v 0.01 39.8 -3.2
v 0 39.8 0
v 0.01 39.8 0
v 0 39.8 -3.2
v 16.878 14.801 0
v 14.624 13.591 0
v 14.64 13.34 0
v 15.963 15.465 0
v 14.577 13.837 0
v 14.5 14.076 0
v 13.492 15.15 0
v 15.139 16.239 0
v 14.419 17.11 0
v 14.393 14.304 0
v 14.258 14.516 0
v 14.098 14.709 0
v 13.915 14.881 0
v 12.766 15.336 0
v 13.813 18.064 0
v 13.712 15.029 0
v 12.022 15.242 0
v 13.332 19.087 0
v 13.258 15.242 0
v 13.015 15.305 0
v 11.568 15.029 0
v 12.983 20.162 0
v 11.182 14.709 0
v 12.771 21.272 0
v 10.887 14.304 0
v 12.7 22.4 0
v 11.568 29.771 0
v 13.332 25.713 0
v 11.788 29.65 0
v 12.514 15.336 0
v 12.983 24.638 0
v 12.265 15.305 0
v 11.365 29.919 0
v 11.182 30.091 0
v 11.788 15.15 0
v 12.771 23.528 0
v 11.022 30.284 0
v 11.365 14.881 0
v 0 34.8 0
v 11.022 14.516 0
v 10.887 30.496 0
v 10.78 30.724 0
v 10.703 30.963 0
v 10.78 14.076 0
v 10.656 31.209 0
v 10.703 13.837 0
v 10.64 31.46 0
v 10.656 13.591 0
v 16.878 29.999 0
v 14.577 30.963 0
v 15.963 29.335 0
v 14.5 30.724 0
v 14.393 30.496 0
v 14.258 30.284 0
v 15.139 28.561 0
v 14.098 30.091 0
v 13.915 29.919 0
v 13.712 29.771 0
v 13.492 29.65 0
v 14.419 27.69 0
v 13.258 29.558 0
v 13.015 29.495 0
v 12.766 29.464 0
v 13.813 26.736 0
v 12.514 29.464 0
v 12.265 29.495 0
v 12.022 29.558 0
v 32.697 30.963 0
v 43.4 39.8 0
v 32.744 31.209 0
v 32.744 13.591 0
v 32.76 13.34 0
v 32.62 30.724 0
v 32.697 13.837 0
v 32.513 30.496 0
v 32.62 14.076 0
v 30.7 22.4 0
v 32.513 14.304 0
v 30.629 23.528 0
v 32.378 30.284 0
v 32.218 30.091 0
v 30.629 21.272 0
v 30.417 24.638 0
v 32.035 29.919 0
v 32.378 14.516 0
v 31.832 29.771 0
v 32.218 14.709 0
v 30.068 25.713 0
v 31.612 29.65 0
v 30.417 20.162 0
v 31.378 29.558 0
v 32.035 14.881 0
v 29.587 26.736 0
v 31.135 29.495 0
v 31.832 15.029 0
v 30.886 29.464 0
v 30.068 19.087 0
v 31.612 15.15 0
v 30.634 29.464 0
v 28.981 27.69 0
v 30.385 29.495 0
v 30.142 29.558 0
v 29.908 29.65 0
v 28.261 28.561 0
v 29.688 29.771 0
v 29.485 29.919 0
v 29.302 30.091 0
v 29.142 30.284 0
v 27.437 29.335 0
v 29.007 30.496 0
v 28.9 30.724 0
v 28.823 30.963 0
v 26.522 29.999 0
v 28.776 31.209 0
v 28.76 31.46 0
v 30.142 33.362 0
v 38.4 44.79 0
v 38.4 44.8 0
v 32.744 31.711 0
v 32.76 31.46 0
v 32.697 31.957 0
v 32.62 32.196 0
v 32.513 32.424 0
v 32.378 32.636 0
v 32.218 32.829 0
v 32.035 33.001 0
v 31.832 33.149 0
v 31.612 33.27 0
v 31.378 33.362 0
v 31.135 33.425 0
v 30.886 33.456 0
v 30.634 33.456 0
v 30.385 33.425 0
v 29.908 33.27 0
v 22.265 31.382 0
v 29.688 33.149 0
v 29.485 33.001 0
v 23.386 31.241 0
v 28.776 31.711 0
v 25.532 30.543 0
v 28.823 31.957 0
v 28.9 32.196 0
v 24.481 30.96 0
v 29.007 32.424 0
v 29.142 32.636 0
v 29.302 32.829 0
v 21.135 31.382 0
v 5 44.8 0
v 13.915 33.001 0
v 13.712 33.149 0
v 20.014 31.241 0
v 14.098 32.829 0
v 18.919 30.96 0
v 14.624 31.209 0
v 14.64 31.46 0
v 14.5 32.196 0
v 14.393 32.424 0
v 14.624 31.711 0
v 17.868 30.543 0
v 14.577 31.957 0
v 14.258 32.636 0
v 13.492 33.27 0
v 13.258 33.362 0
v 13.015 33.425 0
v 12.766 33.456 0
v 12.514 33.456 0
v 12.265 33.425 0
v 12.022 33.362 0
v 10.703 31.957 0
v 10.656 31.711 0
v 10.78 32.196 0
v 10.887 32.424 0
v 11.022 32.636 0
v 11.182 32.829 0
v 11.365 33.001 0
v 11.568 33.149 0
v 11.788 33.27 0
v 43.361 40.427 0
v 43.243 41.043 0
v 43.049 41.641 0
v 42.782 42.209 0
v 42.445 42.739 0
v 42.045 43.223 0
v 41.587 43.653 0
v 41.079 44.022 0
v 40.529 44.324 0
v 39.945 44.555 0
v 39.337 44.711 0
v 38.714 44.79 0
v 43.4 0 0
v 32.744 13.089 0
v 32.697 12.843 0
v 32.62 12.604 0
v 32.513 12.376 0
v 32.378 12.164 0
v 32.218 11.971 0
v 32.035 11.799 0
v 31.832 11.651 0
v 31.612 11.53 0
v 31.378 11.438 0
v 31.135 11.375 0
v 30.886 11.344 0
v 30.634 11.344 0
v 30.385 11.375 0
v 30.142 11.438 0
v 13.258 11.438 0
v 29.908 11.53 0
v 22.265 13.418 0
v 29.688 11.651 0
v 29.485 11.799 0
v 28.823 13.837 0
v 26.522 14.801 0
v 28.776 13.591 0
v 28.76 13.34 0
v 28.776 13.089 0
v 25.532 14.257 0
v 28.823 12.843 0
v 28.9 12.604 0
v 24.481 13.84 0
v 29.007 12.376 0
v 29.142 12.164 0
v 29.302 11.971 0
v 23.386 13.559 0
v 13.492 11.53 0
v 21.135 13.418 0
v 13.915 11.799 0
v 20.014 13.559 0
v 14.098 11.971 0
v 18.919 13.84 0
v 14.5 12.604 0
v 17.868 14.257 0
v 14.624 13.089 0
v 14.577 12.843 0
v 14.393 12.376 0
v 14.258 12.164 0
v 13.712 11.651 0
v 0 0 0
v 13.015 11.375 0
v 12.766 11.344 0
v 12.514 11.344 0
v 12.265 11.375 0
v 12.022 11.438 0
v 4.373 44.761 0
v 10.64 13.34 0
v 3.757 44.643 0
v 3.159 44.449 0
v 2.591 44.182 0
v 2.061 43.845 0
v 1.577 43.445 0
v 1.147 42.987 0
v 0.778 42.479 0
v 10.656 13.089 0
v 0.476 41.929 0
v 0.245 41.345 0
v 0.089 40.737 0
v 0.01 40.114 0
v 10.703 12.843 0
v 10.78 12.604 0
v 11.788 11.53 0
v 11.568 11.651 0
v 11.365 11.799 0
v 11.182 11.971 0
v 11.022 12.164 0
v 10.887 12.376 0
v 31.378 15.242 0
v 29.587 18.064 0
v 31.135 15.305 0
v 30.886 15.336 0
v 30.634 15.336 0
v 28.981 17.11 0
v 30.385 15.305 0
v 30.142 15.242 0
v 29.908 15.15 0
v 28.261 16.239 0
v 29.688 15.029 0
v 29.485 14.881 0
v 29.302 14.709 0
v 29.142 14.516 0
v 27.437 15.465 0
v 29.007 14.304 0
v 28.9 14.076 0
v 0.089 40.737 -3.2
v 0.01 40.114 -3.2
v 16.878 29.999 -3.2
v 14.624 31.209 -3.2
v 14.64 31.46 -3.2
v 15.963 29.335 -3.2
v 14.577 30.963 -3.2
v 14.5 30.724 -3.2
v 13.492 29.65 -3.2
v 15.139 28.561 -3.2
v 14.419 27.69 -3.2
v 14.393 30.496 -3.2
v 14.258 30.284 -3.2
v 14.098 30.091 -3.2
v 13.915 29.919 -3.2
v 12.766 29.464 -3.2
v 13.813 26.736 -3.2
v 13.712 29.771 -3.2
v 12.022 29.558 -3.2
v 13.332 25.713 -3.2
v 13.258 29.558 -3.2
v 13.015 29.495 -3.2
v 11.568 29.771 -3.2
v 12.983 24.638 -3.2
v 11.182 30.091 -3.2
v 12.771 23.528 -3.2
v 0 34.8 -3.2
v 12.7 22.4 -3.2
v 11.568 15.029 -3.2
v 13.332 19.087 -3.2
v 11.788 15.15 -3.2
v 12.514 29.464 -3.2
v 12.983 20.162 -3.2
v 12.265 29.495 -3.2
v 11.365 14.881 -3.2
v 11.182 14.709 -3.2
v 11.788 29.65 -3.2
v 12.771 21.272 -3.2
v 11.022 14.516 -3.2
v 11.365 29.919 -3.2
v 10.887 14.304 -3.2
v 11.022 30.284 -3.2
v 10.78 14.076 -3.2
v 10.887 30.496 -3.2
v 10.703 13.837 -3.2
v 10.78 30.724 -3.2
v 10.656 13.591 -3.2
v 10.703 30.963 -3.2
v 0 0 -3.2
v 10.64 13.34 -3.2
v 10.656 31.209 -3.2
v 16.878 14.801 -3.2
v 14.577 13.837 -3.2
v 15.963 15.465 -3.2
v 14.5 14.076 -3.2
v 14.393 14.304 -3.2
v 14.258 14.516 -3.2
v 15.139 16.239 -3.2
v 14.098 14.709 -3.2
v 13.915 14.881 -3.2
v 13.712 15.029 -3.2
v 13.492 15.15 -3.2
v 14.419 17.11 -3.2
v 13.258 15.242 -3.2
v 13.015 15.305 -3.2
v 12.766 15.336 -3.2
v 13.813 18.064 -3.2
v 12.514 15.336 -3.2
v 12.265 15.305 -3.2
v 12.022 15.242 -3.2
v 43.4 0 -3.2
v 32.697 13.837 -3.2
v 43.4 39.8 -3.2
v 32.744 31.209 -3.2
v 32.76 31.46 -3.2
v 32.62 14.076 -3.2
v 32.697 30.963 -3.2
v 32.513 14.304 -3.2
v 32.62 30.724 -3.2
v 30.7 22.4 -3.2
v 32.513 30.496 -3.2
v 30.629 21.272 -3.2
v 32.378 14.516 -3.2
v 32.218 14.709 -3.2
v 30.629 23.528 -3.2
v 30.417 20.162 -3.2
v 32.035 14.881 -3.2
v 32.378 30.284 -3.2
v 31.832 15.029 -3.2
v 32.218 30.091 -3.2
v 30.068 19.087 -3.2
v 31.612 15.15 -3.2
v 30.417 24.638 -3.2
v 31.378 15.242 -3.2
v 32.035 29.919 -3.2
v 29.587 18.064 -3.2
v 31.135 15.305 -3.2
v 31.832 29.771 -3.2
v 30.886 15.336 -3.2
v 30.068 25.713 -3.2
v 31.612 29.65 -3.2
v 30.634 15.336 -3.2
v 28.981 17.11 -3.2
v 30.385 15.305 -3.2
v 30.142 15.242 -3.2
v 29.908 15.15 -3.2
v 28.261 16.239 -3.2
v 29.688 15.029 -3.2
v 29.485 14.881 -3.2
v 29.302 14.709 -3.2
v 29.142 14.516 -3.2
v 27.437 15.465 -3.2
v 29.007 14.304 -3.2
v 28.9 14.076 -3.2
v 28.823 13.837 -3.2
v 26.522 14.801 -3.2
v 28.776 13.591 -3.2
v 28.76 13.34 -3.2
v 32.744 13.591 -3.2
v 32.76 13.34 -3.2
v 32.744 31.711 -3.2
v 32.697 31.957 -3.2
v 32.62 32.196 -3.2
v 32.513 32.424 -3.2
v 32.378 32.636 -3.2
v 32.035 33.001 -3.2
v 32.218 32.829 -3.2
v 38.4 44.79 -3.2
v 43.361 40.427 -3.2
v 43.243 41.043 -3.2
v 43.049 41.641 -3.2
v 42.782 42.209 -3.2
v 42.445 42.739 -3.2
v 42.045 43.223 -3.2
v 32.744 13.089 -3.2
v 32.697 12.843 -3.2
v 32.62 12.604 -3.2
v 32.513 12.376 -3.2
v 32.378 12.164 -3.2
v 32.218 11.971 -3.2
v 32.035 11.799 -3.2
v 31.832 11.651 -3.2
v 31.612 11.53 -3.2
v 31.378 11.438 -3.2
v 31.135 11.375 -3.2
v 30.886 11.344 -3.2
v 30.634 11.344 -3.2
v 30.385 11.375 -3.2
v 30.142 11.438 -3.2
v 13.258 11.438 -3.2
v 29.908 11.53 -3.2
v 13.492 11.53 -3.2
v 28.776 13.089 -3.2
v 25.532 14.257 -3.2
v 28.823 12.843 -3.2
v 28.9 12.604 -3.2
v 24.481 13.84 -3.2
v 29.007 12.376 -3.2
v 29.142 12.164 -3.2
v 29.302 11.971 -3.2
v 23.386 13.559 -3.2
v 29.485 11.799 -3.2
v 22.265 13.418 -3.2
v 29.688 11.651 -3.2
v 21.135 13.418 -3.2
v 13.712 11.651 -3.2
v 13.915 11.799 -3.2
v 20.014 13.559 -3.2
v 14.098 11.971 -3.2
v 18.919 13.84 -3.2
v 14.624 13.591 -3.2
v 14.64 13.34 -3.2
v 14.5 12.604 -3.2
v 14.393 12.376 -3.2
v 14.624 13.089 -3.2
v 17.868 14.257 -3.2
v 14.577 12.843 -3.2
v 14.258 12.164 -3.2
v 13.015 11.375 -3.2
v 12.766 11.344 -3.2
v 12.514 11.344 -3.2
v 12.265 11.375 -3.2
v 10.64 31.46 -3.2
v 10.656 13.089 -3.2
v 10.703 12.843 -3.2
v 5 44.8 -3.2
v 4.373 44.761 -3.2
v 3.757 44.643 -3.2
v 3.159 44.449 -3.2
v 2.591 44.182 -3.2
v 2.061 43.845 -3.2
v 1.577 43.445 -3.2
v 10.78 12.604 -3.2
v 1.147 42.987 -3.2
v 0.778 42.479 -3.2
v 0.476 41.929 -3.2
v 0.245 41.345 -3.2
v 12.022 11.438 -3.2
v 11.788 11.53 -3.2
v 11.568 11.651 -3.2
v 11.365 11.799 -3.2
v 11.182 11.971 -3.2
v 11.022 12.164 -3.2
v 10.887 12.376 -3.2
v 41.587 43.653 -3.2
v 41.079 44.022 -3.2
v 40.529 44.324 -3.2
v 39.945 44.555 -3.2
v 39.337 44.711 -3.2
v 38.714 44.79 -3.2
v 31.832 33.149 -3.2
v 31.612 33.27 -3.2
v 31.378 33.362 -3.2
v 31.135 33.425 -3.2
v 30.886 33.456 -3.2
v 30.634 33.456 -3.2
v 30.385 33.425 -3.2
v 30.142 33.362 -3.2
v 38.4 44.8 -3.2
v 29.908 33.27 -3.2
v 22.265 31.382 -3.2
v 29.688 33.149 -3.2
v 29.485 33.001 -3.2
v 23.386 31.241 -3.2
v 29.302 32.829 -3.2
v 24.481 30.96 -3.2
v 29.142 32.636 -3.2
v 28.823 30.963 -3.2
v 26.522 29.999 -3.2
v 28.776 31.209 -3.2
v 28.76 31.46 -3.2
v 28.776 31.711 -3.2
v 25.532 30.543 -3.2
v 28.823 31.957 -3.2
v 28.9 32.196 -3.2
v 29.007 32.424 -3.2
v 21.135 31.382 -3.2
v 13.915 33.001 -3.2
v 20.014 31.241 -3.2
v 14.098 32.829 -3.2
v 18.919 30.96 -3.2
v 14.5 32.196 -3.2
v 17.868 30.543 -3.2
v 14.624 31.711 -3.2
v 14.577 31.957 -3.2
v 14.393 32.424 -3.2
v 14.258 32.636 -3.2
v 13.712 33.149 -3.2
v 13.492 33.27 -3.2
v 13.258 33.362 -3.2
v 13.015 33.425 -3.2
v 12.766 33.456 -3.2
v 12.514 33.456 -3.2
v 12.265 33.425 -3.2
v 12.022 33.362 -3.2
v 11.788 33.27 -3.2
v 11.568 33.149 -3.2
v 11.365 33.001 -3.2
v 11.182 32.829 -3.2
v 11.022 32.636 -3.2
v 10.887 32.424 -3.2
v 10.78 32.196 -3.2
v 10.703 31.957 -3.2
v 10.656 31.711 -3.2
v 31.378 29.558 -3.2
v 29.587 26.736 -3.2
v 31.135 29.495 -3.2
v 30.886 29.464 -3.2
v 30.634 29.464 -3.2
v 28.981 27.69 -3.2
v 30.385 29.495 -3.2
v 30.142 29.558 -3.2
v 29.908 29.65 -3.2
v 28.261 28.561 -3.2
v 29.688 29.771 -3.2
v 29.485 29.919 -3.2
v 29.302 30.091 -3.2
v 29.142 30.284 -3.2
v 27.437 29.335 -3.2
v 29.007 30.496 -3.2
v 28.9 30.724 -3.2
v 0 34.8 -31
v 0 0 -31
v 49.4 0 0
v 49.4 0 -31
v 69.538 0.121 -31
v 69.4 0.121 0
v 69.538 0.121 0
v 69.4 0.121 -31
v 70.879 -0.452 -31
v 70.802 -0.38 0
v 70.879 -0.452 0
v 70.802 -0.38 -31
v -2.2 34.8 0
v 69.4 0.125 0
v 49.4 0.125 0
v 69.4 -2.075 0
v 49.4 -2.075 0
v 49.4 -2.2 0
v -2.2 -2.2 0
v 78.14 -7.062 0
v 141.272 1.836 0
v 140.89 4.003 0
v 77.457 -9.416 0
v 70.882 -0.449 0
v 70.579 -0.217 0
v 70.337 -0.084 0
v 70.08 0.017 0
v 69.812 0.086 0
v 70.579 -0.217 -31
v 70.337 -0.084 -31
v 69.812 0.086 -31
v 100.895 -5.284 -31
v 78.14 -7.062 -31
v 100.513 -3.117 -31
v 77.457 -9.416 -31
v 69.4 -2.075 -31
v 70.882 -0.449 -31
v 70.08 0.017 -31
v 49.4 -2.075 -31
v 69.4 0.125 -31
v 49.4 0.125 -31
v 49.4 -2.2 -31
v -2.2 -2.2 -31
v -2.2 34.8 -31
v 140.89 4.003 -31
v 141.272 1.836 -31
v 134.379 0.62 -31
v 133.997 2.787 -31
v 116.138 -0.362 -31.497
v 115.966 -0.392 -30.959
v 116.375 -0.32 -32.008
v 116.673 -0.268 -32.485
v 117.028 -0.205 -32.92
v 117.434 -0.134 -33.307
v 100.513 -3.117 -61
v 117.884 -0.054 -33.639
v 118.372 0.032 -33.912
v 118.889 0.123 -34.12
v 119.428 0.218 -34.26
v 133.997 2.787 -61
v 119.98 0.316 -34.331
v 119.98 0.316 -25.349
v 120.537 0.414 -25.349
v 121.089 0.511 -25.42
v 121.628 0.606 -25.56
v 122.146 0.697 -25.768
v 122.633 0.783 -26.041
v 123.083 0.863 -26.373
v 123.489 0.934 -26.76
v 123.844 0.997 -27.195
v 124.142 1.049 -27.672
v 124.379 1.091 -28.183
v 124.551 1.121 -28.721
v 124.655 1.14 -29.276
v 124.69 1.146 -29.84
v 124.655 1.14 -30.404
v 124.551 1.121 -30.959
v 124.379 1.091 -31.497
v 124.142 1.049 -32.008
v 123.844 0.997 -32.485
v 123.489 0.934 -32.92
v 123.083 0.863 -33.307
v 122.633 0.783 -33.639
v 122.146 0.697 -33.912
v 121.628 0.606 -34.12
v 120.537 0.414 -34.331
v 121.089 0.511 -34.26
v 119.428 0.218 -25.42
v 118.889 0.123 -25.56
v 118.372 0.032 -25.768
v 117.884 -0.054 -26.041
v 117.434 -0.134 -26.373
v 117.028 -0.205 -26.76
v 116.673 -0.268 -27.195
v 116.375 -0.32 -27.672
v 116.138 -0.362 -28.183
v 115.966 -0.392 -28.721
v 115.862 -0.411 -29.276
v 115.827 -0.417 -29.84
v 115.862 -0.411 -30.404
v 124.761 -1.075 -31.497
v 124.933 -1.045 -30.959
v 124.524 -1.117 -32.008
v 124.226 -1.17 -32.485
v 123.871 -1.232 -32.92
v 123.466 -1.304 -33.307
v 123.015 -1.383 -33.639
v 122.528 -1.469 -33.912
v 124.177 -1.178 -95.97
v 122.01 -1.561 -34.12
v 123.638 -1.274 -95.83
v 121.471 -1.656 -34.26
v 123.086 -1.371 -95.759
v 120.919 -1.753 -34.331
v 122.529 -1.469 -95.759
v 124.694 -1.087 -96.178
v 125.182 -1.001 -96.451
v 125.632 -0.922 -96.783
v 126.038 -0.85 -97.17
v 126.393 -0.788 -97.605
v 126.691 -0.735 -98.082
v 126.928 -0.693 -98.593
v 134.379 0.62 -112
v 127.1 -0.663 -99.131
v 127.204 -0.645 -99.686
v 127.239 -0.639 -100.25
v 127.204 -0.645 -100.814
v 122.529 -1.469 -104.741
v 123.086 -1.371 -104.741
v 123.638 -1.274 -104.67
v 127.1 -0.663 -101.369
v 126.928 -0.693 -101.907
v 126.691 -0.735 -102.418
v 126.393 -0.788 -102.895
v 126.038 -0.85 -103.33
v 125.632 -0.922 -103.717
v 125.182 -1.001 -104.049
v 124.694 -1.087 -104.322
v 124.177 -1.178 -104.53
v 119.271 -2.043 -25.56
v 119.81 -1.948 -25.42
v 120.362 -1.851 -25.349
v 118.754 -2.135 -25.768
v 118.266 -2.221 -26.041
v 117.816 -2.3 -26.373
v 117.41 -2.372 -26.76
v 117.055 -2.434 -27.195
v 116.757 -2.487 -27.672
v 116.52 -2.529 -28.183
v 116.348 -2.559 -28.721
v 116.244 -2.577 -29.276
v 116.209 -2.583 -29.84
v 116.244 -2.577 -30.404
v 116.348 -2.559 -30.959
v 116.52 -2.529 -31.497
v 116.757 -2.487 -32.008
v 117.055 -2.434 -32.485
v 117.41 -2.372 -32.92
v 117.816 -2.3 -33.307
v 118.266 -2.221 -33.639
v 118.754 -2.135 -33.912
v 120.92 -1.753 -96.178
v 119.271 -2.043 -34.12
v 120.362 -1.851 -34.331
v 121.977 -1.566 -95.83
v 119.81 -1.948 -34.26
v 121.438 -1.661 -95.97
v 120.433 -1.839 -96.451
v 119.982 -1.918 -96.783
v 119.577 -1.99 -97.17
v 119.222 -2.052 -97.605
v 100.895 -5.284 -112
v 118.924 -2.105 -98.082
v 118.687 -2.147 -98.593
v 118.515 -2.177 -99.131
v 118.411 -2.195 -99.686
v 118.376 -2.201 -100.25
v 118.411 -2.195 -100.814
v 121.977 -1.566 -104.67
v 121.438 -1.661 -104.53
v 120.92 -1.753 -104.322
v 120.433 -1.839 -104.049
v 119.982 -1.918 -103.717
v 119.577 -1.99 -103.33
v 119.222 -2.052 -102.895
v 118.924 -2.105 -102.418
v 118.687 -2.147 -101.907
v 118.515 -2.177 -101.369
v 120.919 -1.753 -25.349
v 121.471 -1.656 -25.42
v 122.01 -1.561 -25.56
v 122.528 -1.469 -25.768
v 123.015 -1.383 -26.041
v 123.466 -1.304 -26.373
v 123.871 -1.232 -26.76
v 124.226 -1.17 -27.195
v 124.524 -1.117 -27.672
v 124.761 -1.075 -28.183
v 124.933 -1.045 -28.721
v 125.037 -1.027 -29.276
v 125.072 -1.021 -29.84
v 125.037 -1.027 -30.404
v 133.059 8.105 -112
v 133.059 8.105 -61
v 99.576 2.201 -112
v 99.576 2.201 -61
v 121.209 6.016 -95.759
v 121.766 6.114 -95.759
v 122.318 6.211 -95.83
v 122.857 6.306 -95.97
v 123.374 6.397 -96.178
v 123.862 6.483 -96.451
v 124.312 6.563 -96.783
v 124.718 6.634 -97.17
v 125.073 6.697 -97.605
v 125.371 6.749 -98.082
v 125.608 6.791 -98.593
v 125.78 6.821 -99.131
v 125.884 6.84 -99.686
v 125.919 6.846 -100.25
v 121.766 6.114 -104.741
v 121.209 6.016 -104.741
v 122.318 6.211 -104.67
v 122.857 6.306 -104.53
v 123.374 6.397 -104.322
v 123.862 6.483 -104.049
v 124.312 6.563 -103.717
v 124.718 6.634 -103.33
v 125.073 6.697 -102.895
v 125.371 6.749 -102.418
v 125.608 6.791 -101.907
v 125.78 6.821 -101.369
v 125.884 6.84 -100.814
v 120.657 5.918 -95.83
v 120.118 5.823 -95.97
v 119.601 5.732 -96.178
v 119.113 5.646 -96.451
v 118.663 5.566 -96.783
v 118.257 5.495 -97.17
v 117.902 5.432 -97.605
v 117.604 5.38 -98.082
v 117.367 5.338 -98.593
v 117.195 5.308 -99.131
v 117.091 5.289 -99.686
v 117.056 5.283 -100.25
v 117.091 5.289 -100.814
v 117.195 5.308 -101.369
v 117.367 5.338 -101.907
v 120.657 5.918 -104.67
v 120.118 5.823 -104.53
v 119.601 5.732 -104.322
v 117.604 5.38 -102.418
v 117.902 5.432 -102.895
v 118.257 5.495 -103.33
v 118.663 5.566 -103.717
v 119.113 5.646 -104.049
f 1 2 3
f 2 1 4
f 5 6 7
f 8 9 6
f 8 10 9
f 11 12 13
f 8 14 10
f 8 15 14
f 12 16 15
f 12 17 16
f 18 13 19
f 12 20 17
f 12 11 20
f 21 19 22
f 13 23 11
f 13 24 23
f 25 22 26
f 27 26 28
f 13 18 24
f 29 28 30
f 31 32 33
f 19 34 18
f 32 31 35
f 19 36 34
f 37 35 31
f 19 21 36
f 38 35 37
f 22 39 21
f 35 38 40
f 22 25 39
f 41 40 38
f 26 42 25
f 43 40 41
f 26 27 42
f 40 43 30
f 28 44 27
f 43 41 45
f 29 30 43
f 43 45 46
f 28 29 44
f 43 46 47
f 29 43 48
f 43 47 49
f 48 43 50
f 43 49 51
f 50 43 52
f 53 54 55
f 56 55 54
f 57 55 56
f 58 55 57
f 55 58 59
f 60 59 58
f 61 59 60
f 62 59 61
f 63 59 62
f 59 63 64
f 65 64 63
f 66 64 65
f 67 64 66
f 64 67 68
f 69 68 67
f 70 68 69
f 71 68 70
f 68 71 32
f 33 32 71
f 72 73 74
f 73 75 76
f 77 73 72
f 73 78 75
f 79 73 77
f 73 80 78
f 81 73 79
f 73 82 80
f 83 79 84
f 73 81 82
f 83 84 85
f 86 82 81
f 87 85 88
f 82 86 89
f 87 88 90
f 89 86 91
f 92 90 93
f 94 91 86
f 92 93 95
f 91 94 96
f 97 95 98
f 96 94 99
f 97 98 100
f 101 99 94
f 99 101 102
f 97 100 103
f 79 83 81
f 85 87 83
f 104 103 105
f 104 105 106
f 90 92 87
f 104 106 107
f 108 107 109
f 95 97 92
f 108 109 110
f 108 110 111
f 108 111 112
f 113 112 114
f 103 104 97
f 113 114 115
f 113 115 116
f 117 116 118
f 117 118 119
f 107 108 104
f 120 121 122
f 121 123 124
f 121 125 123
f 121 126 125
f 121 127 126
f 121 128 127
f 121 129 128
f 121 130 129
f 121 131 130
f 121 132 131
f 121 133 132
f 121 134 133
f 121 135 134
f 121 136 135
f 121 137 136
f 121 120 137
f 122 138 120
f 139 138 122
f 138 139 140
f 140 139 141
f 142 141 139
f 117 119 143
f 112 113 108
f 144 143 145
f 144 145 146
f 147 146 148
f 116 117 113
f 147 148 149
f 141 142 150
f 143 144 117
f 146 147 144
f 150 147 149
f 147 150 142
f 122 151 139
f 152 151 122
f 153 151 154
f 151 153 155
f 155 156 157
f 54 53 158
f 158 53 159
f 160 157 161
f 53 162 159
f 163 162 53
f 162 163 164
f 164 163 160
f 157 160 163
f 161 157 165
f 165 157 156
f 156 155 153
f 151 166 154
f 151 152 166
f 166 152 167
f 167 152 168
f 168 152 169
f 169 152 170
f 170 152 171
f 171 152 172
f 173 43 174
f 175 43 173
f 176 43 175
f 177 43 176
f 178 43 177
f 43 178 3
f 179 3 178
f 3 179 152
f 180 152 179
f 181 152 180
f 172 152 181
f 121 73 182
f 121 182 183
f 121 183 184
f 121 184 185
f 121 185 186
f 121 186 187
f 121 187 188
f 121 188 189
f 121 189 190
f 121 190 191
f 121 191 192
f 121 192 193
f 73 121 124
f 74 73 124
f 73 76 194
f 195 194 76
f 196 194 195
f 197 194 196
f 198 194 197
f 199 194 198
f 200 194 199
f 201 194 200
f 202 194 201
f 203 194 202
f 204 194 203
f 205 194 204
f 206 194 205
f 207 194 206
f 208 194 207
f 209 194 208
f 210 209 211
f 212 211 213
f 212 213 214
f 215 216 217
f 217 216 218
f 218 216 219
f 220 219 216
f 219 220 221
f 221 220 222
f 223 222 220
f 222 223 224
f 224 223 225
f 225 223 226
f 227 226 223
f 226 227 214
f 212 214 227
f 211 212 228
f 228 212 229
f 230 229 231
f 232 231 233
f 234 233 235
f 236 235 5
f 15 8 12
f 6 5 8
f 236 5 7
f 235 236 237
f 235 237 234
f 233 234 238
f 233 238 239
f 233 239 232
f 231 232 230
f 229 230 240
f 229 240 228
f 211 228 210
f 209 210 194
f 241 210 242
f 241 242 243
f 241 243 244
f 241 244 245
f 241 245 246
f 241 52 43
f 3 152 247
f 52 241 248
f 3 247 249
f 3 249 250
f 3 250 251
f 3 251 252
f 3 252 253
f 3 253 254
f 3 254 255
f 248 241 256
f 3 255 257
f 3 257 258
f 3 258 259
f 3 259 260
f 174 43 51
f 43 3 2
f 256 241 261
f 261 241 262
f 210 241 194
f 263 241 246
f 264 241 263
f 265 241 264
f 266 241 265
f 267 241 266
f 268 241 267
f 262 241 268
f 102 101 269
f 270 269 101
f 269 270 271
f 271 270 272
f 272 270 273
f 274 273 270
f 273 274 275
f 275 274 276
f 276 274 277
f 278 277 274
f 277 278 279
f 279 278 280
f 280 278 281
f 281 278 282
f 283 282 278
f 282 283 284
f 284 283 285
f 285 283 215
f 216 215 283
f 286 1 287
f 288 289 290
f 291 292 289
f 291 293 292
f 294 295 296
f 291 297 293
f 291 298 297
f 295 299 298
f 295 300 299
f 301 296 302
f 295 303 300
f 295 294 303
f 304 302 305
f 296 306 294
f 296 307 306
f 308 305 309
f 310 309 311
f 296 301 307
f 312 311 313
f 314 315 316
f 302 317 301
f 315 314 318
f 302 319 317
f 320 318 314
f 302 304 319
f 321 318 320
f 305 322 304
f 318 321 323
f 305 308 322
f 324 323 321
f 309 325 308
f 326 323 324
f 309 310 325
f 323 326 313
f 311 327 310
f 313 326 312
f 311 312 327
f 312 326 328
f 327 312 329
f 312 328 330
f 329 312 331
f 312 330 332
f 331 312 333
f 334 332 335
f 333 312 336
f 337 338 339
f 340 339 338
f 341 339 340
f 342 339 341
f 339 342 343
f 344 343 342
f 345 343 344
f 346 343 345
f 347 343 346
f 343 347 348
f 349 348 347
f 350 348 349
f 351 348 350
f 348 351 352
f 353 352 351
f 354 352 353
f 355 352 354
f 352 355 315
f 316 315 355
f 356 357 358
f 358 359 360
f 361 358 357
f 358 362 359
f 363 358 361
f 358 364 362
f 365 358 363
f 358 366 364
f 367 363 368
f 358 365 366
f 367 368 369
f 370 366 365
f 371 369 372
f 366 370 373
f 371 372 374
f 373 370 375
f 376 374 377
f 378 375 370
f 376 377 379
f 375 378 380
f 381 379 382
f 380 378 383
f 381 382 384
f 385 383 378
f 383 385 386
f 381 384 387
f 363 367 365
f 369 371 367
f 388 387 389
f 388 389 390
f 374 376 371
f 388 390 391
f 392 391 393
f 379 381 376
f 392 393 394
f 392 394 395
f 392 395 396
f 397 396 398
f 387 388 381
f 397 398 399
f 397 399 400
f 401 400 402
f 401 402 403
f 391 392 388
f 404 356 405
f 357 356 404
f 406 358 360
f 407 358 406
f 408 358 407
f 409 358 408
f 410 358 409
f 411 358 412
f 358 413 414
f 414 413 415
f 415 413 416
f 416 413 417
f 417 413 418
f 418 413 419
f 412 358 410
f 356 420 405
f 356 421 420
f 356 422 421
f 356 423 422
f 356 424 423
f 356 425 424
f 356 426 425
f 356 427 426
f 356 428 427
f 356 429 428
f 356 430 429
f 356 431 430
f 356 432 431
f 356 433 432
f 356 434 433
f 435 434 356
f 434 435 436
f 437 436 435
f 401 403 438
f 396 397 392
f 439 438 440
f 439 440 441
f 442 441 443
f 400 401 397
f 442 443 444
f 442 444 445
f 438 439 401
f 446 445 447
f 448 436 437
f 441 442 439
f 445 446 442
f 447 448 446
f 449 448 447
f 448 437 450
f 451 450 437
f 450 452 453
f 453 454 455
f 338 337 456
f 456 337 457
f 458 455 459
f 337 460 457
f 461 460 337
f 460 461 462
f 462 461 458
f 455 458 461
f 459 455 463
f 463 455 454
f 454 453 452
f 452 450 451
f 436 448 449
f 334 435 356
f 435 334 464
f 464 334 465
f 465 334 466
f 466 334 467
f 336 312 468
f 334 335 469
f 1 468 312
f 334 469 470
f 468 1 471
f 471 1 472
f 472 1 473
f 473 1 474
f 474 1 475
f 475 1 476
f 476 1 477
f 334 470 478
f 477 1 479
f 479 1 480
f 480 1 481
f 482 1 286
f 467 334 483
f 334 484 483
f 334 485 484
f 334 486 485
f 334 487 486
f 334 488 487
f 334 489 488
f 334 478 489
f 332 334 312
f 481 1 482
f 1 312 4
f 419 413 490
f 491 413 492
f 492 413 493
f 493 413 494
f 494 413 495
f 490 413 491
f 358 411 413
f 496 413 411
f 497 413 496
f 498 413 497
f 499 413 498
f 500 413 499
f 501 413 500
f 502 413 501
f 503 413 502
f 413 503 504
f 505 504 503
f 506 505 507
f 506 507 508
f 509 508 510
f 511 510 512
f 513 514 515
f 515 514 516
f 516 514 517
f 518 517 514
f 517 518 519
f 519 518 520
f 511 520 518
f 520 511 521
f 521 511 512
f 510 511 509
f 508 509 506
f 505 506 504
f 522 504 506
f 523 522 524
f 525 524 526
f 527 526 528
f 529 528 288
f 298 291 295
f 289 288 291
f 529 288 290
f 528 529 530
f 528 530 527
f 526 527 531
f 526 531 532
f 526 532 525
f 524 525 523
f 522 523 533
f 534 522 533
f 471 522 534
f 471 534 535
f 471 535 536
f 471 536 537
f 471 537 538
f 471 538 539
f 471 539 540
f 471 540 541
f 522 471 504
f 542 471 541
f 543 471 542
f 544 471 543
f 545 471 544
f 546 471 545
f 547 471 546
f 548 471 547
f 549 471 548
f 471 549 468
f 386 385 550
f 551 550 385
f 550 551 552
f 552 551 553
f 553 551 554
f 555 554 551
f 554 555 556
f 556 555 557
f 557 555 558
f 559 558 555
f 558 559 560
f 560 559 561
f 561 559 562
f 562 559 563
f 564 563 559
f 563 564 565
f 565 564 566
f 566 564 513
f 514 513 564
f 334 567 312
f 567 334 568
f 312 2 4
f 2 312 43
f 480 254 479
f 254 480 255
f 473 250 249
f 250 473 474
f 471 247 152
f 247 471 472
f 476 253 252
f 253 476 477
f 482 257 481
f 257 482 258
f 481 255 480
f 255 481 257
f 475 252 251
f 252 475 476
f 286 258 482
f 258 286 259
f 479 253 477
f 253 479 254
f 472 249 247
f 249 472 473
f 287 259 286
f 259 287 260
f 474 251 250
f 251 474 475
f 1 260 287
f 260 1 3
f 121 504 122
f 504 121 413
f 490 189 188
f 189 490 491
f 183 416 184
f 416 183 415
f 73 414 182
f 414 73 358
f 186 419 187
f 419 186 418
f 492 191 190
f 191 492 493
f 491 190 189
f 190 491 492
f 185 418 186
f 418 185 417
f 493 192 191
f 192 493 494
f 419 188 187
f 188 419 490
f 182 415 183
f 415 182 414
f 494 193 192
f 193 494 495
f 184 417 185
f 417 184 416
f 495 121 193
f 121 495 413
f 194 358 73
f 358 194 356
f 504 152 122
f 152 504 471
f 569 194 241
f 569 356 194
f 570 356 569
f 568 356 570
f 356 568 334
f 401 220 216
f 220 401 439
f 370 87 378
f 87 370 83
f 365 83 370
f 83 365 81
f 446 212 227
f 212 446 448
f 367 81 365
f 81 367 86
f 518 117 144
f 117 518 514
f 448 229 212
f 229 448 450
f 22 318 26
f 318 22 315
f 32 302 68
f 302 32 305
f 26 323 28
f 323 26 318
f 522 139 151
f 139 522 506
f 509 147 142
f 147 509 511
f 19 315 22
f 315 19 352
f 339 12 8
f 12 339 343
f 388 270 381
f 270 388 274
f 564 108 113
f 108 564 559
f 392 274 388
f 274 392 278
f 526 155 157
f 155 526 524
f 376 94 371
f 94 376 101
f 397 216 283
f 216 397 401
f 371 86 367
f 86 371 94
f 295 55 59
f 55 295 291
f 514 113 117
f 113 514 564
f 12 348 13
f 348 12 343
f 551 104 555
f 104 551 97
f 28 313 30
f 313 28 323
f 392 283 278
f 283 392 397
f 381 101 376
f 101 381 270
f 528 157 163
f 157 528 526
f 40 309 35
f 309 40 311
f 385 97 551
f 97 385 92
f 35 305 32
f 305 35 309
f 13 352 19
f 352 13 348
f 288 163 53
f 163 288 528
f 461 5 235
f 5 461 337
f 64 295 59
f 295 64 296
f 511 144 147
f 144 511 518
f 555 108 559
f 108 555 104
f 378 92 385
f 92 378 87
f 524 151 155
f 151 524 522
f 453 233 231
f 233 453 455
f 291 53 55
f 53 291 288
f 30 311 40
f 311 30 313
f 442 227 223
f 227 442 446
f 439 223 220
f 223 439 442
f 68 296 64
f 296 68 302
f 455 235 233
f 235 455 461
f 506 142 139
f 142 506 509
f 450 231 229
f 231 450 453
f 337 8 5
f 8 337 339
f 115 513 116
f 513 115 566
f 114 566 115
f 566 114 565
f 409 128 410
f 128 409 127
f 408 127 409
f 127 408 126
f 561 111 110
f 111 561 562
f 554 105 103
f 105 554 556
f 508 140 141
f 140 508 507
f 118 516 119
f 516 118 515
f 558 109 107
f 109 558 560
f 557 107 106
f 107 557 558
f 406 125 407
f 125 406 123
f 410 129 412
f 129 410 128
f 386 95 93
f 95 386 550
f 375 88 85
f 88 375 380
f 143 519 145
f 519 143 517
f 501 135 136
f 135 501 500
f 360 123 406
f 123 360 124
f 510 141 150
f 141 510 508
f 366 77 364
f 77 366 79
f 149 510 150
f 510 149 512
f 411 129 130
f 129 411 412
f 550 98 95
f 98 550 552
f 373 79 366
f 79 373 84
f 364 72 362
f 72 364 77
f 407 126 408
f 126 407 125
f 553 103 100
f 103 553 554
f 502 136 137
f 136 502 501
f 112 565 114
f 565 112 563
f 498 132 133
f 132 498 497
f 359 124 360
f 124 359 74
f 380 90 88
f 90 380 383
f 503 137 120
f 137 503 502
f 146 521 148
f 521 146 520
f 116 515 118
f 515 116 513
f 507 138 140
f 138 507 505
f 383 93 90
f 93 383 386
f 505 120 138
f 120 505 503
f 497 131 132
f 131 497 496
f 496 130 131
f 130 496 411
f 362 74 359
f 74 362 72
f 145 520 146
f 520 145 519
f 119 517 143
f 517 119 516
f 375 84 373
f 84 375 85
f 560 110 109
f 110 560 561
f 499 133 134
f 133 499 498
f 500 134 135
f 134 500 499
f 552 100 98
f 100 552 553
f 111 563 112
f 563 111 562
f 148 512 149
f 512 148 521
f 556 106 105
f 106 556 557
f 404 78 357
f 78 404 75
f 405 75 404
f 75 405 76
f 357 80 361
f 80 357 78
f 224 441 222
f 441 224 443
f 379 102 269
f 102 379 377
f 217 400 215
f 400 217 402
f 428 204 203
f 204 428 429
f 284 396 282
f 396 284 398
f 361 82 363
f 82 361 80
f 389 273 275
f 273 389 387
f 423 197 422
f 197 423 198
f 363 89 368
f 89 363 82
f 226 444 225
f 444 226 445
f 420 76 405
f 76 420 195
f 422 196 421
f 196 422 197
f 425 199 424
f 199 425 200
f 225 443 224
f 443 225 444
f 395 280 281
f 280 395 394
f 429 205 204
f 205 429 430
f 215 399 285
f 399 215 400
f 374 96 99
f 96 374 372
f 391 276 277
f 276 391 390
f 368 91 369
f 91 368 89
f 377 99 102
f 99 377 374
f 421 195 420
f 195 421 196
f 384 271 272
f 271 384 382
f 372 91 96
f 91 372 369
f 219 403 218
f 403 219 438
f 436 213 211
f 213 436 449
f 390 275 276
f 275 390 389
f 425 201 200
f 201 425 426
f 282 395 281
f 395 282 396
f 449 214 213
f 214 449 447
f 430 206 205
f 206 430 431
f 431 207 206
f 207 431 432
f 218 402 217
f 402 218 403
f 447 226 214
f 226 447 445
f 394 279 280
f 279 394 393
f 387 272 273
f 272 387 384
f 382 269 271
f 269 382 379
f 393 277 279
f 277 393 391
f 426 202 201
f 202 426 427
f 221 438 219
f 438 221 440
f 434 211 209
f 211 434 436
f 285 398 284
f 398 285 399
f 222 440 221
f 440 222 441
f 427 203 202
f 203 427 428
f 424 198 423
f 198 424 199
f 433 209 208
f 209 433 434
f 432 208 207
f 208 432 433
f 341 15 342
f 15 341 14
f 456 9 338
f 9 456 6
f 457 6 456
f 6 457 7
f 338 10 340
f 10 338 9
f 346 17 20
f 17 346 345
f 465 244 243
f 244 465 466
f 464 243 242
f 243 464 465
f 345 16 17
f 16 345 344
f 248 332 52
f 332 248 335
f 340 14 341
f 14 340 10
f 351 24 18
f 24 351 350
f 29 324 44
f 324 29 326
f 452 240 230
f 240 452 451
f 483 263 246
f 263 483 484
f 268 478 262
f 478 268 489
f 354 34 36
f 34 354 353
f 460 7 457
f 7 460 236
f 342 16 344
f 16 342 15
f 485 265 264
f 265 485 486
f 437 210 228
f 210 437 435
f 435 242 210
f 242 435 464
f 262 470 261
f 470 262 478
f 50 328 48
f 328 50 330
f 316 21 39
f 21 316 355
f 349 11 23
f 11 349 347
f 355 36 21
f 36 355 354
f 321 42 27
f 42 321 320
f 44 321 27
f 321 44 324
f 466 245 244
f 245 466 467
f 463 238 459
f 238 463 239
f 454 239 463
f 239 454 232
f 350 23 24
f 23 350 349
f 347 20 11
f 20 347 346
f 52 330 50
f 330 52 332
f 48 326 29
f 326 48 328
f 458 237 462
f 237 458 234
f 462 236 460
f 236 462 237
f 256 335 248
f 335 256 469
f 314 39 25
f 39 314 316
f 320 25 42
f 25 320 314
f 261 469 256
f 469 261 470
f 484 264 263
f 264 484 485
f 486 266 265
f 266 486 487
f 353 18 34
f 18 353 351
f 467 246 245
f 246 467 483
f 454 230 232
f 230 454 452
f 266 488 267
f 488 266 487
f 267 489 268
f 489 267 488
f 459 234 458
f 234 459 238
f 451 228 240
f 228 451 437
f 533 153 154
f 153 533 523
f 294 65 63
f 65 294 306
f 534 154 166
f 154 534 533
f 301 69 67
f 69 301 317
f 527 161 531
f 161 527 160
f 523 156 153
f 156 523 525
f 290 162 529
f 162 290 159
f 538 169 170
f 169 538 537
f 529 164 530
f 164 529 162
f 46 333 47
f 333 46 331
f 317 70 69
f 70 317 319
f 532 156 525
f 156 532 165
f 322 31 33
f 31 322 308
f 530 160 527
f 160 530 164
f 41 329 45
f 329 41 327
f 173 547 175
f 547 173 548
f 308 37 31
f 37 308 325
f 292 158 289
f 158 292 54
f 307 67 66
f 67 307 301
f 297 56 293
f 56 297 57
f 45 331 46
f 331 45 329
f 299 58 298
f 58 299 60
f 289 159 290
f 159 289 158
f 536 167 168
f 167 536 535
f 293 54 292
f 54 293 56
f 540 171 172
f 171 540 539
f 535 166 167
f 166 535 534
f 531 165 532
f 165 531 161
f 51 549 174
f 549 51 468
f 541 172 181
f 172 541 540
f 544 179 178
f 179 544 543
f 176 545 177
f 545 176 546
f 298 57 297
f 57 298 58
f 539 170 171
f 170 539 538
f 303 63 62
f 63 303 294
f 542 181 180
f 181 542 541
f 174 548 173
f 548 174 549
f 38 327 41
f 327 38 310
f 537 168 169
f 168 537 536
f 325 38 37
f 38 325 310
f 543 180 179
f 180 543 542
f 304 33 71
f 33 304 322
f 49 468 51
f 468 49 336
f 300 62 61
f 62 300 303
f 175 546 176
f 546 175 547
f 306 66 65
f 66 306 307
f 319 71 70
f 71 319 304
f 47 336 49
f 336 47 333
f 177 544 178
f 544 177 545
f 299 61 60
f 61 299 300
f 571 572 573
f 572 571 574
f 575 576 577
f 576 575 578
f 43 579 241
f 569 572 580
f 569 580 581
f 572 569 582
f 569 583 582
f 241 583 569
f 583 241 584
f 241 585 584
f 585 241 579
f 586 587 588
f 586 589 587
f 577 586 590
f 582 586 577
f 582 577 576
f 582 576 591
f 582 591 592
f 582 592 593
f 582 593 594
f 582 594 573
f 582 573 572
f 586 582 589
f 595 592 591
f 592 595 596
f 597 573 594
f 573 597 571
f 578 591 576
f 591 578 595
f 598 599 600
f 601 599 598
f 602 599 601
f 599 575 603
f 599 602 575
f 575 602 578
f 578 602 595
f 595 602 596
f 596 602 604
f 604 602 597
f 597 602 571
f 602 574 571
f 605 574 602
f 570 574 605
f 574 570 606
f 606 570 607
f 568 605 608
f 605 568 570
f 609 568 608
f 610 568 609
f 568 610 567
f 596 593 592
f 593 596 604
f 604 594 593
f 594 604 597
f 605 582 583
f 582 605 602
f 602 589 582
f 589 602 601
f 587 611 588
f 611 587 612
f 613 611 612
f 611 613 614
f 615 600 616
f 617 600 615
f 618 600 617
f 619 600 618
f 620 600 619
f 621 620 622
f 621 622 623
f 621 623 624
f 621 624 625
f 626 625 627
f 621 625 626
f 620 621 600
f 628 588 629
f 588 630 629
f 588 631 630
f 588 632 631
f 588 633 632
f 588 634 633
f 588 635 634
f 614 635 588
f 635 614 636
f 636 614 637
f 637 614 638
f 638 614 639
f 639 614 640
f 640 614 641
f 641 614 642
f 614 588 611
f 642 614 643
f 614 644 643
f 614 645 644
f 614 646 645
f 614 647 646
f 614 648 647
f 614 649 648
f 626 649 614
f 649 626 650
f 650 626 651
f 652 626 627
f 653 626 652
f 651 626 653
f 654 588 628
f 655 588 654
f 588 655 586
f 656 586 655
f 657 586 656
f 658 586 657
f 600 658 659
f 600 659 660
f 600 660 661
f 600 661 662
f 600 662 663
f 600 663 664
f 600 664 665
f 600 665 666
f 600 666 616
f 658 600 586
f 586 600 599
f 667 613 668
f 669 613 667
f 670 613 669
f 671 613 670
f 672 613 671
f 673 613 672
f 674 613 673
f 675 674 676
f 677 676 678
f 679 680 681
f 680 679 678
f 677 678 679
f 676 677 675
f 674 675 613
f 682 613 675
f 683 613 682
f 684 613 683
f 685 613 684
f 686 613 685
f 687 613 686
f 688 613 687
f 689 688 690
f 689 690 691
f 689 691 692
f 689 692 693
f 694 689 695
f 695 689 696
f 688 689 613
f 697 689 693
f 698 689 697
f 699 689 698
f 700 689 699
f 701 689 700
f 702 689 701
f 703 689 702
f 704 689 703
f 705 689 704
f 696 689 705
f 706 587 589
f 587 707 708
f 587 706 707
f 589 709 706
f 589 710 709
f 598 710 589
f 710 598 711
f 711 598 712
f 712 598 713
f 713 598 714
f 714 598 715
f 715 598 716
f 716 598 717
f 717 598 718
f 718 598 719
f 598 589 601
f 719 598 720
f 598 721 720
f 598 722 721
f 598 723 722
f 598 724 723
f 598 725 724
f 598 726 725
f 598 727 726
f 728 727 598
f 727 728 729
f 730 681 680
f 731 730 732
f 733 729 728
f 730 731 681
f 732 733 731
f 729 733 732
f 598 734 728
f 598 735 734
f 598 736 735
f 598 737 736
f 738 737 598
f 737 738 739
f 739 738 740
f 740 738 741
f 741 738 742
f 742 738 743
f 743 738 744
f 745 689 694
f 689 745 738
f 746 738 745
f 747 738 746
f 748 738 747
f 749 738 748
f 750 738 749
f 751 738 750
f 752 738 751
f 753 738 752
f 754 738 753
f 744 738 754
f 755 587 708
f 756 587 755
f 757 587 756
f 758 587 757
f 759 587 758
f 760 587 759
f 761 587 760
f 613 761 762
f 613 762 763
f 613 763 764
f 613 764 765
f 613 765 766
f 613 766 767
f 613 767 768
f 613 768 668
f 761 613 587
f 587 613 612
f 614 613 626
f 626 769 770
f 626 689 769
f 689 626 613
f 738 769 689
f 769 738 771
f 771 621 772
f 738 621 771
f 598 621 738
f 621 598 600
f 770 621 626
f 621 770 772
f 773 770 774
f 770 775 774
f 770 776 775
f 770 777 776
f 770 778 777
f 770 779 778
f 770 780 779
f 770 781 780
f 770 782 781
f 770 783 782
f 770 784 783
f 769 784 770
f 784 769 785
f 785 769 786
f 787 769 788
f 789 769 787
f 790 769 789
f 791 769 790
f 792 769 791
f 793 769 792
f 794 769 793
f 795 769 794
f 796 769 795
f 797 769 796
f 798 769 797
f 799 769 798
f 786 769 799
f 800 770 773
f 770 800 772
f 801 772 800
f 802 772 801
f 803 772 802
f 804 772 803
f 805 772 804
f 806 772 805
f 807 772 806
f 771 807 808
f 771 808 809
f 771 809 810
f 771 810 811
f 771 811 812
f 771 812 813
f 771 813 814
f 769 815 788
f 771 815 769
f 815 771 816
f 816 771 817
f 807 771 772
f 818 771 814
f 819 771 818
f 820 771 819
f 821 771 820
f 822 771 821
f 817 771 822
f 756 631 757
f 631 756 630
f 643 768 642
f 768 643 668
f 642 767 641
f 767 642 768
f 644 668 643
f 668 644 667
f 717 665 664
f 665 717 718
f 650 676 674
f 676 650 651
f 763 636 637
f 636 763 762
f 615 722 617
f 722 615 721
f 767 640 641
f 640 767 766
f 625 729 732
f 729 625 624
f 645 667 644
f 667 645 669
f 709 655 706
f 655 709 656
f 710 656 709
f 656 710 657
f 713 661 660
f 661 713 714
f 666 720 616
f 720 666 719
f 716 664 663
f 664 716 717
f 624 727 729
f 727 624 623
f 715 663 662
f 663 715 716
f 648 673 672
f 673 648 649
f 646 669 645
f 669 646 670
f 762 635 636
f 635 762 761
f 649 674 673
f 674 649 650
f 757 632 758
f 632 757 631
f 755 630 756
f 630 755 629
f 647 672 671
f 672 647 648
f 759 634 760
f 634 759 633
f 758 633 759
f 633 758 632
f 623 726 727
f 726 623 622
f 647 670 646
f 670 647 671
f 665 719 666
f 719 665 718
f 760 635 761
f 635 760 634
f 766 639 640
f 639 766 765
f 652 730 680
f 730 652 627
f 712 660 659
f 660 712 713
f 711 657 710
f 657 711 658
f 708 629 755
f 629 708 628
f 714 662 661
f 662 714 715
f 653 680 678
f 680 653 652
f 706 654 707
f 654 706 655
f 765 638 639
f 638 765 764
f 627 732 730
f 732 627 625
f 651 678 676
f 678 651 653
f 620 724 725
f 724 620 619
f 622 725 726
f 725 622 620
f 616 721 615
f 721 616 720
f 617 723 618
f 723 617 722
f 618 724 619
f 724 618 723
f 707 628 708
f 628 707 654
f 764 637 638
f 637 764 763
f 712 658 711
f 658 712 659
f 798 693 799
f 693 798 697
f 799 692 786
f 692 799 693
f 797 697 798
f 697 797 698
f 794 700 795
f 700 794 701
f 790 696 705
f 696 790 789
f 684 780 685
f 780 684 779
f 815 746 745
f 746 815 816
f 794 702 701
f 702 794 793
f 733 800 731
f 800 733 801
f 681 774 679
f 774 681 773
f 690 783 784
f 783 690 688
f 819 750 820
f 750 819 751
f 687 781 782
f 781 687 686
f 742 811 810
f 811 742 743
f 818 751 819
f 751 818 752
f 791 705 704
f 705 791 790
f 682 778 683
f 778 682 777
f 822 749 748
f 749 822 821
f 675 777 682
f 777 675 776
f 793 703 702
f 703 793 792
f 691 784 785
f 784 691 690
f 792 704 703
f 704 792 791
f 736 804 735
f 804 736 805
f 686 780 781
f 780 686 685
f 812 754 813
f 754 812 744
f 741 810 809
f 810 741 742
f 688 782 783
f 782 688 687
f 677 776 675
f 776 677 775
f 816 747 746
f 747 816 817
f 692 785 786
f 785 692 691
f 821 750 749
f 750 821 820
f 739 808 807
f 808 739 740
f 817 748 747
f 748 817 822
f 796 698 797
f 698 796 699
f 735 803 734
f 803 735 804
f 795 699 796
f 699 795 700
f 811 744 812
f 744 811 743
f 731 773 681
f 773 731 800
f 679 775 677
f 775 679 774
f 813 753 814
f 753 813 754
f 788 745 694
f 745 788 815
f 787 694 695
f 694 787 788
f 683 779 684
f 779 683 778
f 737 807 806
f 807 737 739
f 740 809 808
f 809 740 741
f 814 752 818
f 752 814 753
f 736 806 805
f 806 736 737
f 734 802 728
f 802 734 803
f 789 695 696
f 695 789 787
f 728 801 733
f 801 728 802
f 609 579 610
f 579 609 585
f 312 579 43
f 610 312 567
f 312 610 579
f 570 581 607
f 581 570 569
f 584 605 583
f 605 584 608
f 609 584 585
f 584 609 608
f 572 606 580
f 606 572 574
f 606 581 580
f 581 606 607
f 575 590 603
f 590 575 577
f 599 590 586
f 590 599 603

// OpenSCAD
// Parameters
$fn=50; // Amount of faces for circles
// face1
plane_x = 43.4;
plane_y = 44.8;
plane_z = 3.2;
plane_corner_radius = 5;
UHF_r = 9;
UHFs_r = 2;
screw_offset = 9.06;
face1_translate = [0, 0, -plane_z];

thickness_of_vertical = 2.2;//3.2;
depth_of_vertical = 31;
// faceR
faceR_x = thickness_of_vertical;
faceR_y = 34.8;
faceR_z = depth_of_vertical;
faceR_translate = [-faceR_x, 0, -faceR_z];
_rolling_x = -faceR_x;

// face3
face3_x = 51.6;
face3_y = thickness_of_vertical;
face3_z = depth_of_vertical;
face3_translate = [-faceR_x, -face3_y, -face3_z];

// face4
face4_rotation_z = 0;
face4_x = 20;
face4_y = thickness_of_vertical;
face4_z = depth_of_vertical;
face4_rotate = [0, 0, face4_rotation_z];
face4_translate = [face3_x-faceR_x+(face4_y*sin(face4_rotation_z)), -face4_y+0.125, -face4_z];

//face5
face5_rotation_z = -42.34;
face5_x = 10.9;
face5_y = thickness_of_vertical;
face5_z = depth_of_vertical;
face5_corr_calc_angle = 90+face5_rotation_z;
face5_x_correction = 0;//face5_y*cos(face5_corr_calc_angle);
face5_y_correction = 0;//face5_y*sin(face5_corr_calc_angle);
face5_rotate = [0, 0, face5_rotation_z];
face5_translate = [face3_x-faceR_x+(face4_y*sin(face4_rotation_z))+face4_x*cos(face4_rotation_z),
                    -face4_y+face4_x*sin(face4_rotation_z)+0.125,
                    -face5_z];

//face6
face6_rotation_z = 10.; //previous 16.1
face6_x = 64.8; //previous 83.3, but needed to be shortened by 25 mm on top or 20 mm on bottom, so shortened by 22.5 mm = 60.8 //but then added 1mm because that was too short
face6_y = thickness_of_vertical;
face6_z = depth_of_vertical;
face6_rotate = [0, 0, face6_rotation_z];
face6_translate = [face3_x-faceR_x+(face4_y*sin(face4_rotation_z))+face4_x*cos(face4_rotation_z)+face5_x*cos(face5_rotation_z),
                    -face4_y+face4_x*sin(face4_rotation_z)+0.125+face5_x*sin(face5_rotation_z),
                    -face5_z];

//face7
face7_x = 34;
face7_y = thickness_of_vertical;
face7_z = 112;
face7_x_offset = face6_x - (face7_x + 7);
face7_translate = [face7_x_offset, 0, (face6_z-face7_z)];

//face7-ex
face7_ex_dz_to_face6 = 30;
face7_ex_thickness = 6.5;

// hole SW
holeSW_r = 4.5;
holeSW_y = 20;
holeSW_lateral_padding = 9.45;///2.75 + 6.7;
holeSW_x_translate = face7_x-(holeSW_r+holeSW_lateral_padding);
holeSW_translate = [holeSW_x_translate, -holeSW_y/2, -(face6_z-face7_z-face5_z)-29.84];

// hole NW
holeNW_r = 4.5;
holeNW_y = 20;
holeNW_lateral_padding = holeSW_lateral_padding - 2.2;
holeNW_x_translate = face7_x-(holeNW_r+holeNW_lateral_padding);
holeNW_translate = [holeNW_x_translate, face7_y-holeNW_y/2, -(face6_z-face7_z-face5_z)-100.25];

//face8 22.5mm
face8_x = 22.5;
face8_y = thickness_of_vertical;
face8_z = depth_of_vertical;
face8_translate = [face7_x_offset+face7_x, face7_ex_thickness-thickness_of_vertical/2, (face6_z-face7_z)];


//face9 28mm

// Rounded corner cutter
module rounded_corner_cutter(r, z, side="SW") {
    if (side == "SW") {
        difference() {
            cube([r, r, z]);
            translate([r, r, 0]) cylinder(z, r, r);
        }
    } else if (side == "SE") {
        translate([r, 0, 0]) rotate([0, 0, 90]) difference() {
            cube([r, r, z]);
            translate([r, r, 0]) cylinder(z, r, r);
        }
    } else if (side == "NE") {
        translate([r, r, 0]) rotate([0, 0, -180]) difference() {
            cube([r, r, z]);
            translate([r, r, 0]) cylinder(z, r, r);
        }
    } else if (side == "NW") {
        translate([0, r, 0]) rotate([0, 0, -90]) difference() {
            cube([r, r, z]);
            translate([r, r, 0]) cylinder(z, r, r);
        }
    }
}


//face1
translate(face1_translate) difference() {
    //Plane
    cube([plane_x, plane_y, plane_z]);
    translate([0, plane_y-plane_corner_radius, 0]) rounded_corner_cutter(plane_corner_radius, plane_z, "NW");
    translate([plane_x-plane_corner_radius, plane_y-plane_corner_radius, 0]) rounded_corner_cutter(plane_corner_radius, plane_z, "NE");
    // UHF
    translate([plane_x/2, plane_y/2, 0]) cylinder(plane_z, UHF_r, UHF_r);
    //Screw NE
    translate([(plane_x/2)+screw_offset, (plane_y/2)+screw_offset, 0]) cylinder(plane_z, UHFs_r, UHFs_r);
    //Screw SE
    translate([(plane_x/2)+screw_offset, (plane_y/2)-screw_offset, 0]) cylinder(plane_z, UHFs_r, UHFs_r);
    //Screw SW
    translate([(plane_x/2)-screw_offset, (plane_y/2)-screw_offset, 0]) cylinder(plane_z, UHFs_r, UHFs_r);
    //Screw NW
    translate([(plane_x/2)-screw_offset, (plane_y/2)+screw_offset, 0]) cylinder(plane_z, UHFs_r, UHFs_r);
}

//faceR
translate(faceR_translate) cube([faceR_x, faceR_y, faceR_z]);

//face3
translate(face3_translate) cube([face3_x, face3_y, face3_z]);

//face4
translate(face4_translate) rotate(face4_rotate) cube([face4_x, face4_y, face4_z]);
// face4 joiner to face3
translate([face3_x-faceR_x, -face3_y, -face4_z]) difference() {
    cube([face4_y*sin(face4_rotation_z), face4_y, face4_z]);
    translate([face4_y*sin(face4_rotation_z)-.15, 0, 0]) rounded_corner_cutter(.15, face4_z, "SE");
}

//face5
translate(face5_translate) rotate(face5_rotate) cube([face5_x, face5_y, face5_z]);
// face5 joiner to face4
difference() {
    translate(face5_translate) cylinder(face5_z, face5_y, face5_y);
    translate(face4_translate) rotate(face4_rotate) translate([10, face4_y, 0])  cube([face4_x, face4_y, face4_z]);
    translate(face4_translate) rotate(face4_rotate) translate([0, -face4_y, 0])  cube([face4_x, face4_y, face4_z]);
    translate(face5_translate) rotate(face5_rotate) translate([0, -face5_y, 0]) cube([face5_x, face5_y, face5_z]);
}

//face6
translate(face6_translate) rotate(face6_rotate) {
    difference() {
        union() {
            cube([face6_x, face6_y, face6_z]);
            translate(face7_translate) cube([face7_x, face7_y, face7_z]);
            translate(face7_translate) cube([face7_x, face7_ex_thickness+thickness_of_vertical/2, (face7_z-face6_z-face7_ex_dz_to_face6)]);
            //face8
            //translate(face8_translate) cube([face8_x, face8_y, face8_z]);
        }
        translate(face7_translate) union() {
            //holeSW
            translate(holeSW_translate) rotate([-90, 0, 0]) cylinder(holeSW_y, holeSW_r, holeSW_r);
            //holeNW
            translate(holeNW_translate) rotate([-90, 0, 0]) cylinder(holeNW_y, holeNW_r, holeNW_r);
        }
    }
}
